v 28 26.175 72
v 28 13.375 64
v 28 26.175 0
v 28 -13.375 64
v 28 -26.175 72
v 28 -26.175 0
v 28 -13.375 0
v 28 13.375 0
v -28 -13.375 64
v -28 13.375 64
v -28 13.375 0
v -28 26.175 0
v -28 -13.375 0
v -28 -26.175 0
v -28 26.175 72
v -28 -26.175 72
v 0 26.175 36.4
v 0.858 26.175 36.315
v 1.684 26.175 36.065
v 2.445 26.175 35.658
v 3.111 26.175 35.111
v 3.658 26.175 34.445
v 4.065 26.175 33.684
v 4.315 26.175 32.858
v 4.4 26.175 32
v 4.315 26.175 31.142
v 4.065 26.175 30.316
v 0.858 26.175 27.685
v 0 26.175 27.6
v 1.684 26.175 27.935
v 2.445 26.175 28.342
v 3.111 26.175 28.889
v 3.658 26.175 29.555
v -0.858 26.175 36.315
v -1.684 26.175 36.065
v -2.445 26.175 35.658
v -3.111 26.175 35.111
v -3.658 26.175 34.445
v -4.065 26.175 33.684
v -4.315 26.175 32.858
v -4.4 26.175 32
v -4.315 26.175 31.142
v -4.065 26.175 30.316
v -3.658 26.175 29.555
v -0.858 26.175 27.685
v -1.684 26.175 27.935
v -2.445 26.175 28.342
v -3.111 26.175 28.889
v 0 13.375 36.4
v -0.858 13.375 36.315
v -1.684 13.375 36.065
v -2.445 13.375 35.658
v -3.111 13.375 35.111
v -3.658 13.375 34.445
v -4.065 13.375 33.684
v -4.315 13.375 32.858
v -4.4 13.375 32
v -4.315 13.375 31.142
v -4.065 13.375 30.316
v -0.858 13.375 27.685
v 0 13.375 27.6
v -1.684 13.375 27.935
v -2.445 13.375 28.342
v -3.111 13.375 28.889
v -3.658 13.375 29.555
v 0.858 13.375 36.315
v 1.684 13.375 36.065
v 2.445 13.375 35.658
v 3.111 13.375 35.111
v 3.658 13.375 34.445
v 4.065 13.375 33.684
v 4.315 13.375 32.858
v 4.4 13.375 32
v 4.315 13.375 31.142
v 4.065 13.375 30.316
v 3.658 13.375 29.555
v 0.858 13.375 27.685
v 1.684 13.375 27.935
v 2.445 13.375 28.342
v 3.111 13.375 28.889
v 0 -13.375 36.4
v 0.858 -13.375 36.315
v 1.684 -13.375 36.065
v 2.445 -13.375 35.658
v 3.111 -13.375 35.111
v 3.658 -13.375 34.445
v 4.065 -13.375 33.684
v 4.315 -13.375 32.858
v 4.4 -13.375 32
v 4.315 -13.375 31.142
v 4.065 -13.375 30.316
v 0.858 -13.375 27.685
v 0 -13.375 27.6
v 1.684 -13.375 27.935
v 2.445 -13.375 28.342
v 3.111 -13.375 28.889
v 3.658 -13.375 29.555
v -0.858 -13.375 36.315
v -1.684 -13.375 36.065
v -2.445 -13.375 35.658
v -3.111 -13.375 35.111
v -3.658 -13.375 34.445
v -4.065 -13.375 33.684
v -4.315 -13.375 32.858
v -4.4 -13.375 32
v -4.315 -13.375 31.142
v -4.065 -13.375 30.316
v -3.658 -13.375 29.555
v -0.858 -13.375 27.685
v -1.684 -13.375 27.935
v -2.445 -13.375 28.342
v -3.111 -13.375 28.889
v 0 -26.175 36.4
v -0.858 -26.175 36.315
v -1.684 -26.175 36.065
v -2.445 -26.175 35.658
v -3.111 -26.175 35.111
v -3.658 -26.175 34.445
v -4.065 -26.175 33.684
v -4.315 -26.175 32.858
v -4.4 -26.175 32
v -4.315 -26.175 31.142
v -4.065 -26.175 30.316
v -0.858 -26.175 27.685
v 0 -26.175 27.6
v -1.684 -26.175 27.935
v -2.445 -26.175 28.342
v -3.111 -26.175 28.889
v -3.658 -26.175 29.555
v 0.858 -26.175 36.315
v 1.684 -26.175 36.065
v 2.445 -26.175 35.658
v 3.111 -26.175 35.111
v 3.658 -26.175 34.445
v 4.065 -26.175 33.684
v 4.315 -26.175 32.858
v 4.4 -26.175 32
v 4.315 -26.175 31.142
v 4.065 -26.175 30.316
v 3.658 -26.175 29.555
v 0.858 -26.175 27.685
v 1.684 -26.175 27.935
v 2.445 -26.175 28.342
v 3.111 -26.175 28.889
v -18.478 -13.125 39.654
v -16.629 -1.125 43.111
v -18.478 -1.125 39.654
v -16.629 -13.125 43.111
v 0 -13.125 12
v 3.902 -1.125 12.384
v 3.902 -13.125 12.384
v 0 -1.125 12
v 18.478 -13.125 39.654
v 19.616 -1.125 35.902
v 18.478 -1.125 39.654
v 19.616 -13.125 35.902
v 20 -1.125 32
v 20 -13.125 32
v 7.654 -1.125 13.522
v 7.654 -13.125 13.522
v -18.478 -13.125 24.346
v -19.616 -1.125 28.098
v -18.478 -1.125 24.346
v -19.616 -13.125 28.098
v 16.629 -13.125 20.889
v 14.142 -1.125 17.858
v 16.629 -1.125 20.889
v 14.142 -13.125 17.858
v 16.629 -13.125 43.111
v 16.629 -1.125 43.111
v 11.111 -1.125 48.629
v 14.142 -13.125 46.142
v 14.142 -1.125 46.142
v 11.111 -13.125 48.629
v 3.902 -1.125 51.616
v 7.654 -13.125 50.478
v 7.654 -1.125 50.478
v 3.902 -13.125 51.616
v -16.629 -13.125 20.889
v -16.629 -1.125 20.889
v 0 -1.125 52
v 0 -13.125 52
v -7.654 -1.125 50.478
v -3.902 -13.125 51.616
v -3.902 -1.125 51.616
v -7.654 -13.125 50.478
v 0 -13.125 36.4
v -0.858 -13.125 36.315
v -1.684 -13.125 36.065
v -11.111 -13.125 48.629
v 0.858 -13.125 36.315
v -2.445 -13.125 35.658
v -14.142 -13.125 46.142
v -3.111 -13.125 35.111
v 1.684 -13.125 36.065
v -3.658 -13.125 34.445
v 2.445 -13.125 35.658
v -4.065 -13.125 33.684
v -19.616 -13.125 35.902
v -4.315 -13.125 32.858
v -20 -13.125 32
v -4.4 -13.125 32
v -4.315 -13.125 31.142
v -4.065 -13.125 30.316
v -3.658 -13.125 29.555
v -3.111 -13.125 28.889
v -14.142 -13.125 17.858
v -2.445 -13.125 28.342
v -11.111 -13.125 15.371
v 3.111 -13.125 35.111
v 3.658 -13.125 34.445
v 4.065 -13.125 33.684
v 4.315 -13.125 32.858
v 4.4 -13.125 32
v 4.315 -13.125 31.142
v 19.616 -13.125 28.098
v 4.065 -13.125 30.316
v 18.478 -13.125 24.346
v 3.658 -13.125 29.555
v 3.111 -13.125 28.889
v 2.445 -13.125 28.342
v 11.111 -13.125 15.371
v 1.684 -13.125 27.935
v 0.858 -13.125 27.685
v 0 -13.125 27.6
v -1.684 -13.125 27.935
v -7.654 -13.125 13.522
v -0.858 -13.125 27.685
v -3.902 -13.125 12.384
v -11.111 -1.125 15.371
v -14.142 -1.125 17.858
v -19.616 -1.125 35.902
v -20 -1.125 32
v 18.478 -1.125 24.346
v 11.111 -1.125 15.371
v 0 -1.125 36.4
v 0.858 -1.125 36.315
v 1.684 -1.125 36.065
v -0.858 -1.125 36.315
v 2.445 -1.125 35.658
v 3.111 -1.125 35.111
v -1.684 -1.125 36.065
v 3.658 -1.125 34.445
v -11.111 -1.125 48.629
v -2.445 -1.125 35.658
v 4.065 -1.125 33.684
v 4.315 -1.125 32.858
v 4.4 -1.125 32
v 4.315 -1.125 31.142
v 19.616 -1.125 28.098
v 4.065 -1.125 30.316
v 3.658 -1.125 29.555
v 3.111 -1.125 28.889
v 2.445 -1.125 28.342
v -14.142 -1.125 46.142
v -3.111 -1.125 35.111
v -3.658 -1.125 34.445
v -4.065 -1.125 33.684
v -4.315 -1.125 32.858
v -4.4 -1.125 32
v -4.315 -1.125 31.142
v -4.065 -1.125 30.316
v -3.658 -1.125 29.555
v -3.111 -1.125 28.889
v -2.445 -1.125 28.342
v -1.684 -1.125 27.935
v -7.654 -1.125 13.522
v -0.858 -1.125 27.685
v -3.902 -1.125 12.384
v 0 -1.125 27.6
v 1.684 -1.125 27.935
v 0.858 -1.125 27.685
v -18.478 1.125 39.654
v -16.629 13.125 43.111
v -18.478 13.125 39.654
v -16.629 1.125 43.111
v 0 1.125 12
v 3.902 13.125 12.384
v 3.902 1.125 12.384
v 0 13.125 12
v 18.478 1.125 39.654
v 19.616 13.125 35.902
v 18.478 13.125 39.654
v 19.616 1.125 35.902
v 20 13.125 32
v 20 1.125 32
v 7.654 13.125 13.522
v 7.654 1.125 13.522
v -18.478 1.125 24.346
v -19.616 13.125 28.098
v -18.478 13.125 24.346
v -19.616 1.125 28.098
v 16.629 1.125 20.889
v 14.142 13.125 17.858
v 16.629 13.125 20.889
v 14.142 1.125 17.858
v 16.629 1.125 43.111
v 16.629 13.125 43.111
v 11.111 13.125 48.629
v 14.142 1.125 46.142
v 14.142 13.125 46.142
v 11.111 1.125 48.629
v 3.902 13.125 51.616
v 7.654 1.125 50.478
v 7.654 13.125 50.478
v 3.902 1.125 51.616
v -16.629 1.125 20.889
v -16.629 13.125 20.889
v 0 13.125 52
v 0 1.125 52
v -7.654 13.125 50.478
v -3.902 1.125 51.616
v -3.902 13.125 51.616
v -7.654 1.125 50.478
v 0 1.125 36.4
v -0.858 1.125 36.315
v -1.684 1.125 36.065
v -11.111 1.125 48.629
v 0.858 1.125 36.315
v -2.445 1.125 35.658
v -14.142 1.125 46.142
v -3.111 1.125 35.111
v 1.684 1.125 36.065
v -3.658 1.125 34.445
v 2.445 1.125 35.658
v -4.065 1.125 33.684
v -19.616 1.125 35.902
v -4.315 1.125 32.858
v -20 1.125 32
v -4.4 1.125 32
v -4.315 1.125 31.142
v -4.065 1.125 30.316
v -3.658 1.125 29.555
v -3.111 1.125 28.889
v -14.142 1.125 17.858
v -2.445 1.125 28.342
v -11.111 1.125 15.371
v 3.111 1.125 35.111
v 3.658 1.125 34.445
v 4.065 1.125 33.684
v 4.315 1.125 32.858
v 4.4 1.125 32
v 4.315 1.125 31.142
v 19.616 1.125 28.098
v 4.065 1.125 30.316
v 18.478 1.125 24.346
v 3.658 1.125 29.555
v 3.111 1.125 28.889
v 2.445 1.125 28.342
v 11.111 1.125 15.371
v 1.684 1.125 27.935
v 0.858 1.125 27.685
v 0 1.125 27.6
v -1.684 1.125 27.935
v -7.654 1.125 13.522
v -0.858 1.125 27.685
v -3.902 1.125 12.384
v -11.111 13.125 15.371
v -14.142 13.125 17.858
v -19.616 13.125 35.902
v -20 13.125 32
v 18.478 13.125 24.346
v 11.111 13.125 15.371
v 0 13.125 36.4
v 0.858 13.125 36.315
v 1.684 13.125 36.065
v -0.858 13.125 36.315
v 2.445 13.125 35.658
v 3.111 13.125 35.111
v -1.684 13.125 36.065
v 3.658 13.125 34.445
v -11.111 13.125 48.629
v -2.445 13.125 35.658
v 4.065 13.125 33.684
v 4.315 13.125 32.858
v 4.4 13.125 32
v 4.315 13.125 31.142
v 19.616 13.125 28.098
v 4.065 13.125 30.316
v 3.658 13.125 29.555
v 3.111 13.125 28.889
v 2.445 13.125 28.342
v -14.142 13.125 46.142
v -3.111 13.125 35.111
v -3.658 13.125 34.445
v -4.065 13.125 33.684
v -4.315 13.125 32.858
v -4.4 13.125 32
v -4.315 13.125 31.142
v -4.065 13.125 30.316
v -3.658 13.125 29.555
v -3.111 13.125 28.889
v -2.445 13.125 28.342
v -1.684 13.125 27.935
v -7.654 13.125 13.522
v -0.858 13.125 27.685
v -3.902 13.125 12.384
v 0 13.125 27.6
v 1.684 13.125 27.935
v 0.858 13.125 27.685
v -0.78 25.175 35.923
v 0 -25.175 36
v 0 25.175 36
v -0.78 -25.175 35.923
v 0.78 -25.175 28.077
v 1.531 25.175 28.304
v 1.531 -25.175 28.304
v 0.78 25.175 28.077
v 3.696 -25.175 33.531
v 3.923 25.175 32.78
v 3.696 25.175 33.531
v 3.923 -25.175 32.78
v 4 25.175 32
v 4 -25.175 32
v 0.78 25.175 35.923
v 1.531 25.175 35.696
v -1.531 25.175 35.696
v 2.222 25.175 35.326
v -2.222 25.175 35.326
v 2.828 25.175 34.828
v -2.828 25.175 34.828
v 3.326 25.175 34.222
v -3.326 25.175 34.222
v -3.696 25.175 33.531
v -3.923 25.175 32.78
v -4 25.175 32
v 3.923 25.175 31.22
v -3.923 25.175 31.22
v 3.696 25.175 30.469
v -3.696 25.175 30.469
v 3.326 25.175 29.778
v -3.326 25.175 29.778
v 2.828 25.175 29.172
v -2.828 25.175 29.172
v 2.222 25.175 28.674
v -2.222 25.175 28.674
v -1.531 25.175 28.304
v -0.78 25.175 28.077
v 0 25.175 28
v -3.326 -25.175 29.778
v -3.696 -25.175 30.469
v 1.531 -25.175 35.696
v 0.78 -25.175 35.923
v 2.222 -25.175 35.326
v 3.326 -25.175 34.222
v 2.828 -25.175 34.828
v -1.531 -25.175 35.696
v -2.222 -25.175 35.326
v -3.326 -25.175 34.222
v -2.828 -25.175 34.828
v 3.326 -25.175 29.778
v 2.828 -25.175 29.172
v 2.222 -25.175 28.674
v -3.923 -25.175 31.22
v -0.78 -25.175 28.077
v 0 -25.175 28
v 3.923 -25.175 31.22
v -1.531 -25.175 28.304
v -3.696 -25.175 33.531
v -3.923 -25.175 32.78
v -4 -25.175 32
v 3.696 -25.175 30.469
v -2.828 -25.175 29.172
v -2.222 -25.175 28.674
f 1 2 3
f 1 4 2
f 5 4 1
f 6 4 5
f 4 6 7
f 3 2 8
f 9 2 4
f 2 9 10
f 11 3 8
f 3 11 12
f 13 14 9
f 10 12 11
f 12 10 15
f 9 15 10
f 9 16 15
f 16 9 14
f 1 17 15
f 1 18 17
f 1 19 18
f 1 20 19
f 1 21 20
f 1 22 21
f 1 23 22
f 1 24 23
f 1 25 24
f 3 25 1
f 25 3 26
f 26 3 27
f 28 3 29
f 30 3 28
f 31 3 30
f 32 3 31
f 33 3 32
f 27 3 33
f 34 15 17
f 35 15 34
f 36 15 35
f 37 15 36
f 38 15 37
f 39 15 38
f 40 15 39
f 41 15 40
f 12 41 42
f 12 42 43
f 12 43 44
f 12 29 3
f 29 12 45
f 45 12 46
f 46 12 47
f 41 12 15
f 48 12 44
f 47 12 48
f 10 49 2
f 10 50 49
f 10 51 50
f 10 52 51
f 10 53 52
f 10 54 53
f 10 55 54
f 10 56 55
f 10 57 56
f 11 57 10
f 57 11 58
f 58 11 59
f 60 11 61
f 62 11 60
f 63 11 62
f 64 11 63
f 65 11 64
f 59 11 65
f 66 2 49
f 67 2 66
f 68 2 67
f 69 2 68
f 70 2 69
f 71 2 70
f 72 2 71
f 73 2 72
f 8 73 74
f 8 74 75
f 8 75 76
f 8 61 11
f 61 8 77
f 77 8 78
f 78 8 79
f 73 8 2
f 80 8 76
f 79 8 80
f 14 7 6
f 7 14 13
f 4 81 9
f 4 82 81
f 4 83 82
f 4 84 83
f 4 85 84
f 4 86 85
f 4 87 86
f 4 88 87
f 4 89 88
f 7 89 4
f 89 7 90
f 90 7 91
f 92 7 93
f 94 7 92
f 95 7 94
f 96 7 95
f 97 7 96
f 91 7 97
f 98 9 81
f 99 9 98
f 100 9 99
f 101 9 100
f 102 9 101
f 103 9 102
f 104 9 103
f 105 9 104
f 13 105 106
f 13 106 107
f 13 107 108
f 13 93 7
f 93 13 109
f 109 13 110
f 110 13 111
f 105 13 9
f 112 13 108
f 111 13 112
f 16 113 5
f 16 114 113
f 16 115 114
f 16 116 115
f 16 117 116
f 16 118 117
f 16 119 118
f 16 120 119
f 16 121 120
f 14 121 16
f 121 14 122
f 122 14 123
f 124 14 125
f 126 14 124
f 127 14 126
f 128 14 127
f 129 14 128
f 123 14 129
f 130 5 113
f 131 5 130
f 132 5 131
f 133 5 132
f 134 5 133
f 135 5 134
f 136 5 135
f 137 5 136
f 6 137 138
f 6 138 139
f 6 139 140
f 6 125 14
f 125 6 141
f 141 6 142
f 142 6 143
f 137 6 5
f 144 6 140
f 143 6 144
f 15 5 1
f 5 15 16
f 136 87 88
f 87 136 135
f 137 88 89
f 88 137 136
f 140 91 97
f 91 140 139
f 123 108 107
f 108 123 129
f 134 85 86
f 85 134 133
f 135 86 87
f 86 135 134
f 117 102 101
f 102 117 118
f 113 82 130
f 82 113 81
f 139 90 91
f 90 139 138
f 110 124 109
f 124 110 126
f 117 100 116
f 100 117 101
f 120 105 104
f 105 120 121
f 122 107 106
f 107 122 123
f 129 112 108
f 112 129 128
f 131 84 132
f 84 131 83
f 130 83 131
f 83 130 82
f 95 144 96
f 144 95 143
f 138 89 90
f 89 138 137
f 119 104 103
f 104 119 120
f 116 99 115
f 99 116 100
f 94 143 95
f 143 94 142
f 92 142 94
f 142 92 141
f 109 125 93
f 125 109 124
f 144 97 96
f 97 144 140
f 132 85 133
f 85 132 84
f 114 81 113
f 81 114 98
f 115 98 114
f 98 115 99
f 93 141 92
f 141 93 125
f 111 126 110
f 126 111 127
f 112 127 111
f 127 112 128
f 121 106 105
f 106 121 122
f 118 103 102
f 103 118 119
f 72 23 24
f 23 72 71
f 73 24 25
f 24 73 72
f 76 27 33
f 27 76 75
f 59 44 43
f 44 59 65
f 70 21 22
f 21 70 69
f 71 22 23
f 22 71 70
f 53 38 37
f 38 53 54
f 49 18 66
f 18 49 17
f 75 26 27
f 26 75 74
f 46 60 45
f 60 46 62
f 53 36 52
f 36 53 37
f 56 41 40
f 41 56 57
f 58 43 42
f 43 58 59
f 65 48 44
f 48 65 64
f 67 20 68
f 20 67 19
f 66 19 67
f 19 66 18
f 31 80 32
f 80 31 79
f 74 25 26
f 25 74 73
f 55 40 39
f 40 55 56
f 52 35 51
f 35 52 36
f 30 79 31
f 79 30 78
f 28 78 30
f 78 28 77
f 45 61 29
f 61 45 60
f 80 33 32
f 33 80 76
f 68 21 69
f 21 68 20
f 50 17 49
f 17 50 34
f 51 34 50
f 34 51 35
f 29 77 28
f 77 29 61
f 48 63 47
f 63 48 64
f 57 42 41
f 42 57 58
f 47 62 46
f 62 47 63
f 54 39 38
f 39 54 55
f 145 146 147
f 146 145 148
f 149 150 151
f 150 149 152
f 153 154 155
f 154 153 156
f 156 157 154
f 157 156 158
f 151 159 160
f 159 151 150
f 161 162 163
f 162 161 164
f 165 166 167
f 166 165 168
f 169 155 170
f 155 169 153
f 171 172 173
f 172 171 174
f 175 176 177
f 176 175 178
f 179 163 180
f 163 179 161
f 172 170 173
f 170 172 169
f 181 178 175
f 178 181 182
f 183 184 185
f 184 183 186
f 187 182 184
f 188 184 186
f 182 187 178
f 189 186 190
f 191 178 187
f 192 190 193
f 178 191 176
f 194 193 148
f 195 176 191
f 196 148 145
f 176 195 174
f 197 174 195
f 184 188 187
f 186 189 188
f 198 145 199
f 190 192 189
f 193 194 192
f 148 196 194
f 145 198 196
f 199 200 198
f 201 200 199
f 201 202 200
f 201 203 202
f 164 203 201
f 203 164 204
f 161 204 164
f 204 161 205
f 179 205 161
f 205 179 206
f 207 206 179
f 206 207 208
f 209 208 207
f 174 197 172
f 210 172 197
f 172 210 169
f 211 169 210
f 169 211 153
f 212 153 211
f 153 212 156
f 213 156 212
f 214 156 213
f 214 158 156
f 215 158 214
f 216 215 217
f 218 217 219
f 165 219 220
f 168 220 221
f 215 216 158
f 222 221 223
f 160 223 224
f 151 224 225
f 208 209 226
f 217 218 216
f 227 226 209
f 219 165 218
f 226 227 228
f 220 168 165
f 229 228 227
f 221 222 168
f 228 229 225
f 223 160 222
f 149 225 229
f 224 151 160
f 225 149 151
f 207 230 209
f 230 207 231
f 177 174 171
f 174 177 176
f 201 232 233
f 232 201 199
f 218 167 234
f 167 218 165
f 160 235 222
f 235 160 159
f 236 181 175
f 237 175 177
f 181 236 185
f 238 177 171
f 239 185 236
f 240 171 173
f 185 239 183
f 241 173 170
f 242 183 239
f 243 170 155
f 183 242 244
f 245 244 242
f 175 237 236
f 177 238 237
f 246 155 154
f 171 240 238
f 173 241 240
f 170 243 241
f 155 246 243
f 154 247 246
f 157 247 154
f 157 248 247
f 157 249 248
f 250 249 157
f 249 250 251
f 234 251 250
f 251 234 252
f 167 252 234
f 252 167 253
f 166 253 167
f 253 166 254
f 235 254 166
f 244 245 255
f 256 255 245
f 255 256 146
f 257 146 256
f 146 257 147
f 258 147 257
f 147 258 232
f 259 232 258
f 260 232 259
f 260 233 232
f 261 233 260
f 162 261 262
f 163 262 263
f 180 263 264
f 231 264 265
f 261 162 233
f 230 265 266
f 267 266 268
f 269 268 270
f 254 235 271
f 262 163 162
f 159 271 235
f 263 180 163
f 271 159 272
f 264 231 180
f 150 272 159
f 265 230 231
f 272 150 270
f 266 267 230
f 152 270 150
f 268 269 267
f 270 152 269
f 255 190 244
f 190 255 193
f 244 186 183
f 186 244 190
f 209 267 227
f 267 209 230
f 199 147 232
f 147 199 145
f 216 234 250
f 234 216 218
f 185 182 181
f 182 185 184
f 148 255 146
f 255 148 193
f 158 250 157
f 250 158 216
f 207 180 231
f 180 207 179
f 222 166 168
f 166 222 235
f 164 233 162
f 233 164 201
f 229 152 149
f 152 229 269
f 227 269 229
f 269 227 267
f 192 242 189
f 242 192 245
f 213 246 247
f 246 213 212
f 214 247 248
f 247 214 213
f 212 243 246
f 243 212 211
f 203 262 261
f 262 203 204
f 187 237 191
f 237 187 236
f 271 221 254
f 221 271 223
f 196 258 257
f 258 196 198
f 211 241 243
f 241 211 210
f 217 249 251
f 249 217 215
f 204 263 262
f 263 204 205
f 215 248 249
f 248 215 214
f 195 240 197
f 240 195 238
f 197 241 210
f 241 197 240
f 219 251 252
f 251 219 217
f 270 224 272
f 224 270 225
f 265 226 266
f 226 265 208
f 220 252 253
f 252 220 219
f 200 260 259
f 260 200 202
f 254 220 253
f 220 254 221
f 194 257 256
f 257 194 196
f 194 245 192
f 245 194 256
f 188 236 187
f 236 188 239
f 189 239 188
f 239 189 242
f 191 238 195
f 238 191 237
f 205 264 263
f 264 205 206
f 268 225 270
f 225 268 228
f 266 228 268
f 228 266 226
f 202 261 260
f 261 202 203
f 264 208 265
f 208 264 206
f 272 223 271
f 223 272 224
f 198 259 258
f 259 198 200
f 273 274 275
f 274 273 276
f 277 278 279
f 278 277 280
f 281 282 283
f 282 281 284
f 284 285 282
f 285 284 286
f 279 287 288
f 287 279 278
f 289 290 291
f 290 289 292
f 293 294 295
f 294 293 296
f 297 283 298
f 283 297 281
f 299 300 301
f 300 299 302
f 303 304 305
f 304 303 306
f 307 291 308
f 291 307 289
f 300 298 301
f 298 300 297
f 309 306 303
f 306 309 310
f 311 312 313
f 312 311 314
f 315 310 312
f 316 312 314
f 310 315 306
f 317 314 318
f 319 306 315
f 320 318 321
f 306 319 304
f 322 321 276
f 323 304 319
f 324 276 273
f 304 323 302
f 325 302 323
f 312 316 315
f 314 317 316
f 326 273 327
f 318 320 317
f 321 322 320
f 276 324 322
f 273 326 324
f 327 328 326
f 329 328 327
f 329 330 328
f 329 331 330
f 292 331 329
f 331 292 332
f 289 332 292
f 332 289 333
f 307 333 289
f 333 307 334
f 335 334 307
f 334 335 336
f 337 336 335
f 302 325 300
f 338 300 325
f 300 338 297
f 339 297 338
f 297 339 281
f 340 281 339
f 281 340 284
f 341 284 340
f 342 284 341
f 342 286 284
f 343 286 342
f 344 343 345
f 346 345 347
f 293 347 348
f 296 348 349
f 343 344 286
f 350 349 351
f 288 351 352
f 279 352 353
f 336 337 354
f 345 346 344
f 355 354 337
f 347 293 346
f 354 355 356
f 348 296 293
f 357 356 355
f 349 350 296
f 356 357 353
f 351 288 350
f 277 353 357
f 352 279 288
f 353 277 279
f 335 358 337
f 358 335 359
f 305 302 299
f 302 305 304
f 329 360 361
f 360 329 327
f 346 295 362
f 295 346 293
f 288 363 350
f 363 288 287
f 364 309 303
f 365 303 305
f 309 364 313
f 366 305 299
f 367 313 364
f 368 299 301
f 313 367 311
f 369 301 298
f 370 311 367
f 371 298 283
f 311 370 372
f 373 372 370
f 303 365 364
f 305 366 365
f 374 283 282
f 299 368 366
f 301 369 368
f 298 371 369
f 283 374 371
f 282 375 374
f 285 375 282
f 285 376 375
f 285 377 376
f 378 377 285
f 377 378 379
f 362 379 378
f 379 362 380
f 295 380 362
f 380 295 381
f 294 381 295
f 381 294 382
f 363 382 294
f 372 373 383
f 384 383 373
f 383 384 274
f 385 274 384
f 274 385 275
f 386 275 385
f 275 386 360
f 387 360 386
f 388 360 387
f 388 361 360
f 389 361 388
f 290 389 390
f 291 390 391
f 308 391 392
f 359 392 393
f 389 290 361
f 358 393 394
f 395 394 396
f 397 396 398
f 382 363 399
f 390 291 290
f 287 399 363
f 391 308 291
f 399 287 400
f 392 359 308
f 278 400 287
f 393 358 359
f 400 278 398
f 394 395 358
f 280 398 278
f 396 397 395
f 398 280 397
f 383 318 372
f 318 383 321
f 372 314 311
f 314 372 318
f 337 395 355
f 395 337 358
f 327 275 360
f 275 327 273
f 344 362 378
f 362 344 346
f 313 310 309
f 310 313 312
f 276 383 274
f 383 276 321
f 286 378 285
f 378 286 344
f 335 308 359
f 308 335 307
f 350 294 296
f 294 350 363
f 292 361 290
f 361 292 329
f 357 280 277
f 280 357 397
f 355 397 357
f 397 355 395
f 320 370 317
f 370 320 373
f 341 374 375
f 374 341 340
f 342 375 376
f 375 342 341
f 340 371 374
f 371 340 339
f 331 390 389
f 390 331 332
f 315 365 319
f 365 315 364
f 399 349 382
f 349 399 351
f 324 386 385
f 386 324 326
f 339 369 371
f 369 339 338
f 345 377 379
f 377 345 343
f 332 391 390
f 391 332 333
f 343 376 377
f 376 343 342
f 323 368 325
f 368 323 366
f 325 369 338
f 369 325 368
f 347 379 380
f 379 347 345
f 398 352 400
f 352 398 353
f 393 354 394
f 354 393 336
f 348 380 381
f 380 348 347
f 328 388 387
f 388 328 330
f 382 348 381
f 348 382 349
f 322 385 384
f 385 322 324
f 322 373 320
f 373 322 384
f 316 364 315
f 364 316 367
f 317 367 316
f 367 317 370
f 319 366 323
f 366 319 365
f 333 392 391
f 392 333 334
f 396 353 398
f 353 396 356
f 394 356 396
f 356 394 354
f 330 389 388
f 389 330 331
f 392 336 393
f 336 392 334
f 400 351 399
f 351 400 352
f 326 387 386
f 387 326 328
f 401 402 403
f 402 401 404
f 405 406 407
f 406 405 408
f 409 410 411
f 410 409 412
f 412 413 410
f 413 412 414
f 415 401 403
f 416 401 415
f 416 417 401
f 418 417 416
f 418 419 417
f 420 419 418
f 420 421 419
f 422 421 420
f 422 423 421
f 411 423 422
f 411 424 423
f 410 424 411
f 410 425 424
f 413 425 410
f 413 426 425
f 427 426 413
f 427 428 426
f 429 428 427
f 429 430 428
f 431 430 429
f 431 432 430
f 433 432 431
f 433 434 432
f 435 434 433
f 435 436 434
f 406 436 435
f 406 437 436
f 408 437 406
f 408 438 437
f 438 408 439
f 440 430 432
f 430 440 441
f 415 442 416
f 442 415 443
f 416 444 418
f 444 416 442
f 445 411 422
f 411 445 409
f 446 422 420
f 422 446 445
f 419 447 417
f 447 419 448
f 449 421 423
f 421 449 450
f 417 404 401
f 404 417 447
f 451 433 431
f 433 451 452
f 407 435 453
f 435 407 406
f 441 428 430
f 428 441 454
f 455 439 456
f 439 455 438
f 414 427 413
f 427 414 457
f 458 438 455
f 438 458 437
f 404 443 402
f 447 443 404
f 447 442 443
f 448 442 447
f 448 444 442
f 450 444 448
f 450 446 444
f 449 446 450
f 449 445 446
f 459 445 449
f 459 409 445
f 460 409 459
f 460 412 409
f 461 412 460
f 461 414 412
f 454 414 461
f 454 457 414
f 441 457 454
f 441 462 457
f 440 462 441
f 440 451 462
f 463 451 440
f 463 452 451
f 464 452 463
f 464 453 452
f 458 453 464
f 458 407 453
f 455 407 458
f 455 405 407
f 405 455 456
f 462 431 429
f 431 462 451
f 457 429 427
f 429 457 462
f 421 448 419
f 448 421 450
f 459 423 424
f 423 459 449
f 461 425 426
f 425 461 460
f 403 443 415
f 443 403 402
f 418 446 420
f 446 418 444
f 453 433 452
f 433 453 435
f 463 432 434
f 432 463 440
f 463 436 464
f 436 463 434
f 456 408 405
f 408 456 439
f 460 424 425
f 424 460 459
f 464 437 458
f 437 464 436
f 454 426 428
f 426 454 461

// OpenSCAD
$fn = 32;

// ------------------------------------------------------------------------
// Trolley wheel set: wheels d40, fork 64 mm tall
// Every part is its own module, assembly() places every instance.
// ------------------------------------------------------------------------

// --- part 1 ---
module trolley_fork() {
  difference() {
    union() {
      translate([-28, 13.375, 0]) cube([56, 12.8, 64]);
      translate([-28, -26.175, 0]) cube([56, 12.8, 64]);
      translate([-28, -26.175, 64]) cube([56, 52.35, 8]);
    }
    translate([0, -19.775, 32]) rotate([90, 0, 0]) cylinder(h = 14.8, d = 8.8, center = true);
    translate([0, 19.775, 32]) rotate([90, 0, 0]) cylinder(h = 14.8, d = 8.8, center = true);
  }
}

// --- part 2 ---
module trolley_wheel() {
  difference() {
      translate([0, 0, 0]) cylinder(h = 12, d = 40);
      translate([0, 0, -1]) cylinder(h = 14, d = 8.8);
    }
}

// --- part 3 ---
module trolley_axle() {
  translate([0, 0, -25.175]) cylinder(h = 50.35, d = 8);
}

// --- assembly ---
module assembly() {
  color([0.80, 0.24, 0.20]) translate([0, 0, 0]) rotate([0, 0, 0]) trolley_fork();
  color([0.20, 0.45, 0.75]) translate([0, -1.125, 32]) rotate([90, 0, 0]) trolley_wheel();
  color([0.25, 0.62, 0.32]) translate([0, 13.125, 32]) rotate([90, 0, 0]) trolley_wheel();
  color([0.92, 0.70, 0.18]) translate([0, 0, 32]) rotate([90, 0, 0]) trolley_axle();
}

assembly();
